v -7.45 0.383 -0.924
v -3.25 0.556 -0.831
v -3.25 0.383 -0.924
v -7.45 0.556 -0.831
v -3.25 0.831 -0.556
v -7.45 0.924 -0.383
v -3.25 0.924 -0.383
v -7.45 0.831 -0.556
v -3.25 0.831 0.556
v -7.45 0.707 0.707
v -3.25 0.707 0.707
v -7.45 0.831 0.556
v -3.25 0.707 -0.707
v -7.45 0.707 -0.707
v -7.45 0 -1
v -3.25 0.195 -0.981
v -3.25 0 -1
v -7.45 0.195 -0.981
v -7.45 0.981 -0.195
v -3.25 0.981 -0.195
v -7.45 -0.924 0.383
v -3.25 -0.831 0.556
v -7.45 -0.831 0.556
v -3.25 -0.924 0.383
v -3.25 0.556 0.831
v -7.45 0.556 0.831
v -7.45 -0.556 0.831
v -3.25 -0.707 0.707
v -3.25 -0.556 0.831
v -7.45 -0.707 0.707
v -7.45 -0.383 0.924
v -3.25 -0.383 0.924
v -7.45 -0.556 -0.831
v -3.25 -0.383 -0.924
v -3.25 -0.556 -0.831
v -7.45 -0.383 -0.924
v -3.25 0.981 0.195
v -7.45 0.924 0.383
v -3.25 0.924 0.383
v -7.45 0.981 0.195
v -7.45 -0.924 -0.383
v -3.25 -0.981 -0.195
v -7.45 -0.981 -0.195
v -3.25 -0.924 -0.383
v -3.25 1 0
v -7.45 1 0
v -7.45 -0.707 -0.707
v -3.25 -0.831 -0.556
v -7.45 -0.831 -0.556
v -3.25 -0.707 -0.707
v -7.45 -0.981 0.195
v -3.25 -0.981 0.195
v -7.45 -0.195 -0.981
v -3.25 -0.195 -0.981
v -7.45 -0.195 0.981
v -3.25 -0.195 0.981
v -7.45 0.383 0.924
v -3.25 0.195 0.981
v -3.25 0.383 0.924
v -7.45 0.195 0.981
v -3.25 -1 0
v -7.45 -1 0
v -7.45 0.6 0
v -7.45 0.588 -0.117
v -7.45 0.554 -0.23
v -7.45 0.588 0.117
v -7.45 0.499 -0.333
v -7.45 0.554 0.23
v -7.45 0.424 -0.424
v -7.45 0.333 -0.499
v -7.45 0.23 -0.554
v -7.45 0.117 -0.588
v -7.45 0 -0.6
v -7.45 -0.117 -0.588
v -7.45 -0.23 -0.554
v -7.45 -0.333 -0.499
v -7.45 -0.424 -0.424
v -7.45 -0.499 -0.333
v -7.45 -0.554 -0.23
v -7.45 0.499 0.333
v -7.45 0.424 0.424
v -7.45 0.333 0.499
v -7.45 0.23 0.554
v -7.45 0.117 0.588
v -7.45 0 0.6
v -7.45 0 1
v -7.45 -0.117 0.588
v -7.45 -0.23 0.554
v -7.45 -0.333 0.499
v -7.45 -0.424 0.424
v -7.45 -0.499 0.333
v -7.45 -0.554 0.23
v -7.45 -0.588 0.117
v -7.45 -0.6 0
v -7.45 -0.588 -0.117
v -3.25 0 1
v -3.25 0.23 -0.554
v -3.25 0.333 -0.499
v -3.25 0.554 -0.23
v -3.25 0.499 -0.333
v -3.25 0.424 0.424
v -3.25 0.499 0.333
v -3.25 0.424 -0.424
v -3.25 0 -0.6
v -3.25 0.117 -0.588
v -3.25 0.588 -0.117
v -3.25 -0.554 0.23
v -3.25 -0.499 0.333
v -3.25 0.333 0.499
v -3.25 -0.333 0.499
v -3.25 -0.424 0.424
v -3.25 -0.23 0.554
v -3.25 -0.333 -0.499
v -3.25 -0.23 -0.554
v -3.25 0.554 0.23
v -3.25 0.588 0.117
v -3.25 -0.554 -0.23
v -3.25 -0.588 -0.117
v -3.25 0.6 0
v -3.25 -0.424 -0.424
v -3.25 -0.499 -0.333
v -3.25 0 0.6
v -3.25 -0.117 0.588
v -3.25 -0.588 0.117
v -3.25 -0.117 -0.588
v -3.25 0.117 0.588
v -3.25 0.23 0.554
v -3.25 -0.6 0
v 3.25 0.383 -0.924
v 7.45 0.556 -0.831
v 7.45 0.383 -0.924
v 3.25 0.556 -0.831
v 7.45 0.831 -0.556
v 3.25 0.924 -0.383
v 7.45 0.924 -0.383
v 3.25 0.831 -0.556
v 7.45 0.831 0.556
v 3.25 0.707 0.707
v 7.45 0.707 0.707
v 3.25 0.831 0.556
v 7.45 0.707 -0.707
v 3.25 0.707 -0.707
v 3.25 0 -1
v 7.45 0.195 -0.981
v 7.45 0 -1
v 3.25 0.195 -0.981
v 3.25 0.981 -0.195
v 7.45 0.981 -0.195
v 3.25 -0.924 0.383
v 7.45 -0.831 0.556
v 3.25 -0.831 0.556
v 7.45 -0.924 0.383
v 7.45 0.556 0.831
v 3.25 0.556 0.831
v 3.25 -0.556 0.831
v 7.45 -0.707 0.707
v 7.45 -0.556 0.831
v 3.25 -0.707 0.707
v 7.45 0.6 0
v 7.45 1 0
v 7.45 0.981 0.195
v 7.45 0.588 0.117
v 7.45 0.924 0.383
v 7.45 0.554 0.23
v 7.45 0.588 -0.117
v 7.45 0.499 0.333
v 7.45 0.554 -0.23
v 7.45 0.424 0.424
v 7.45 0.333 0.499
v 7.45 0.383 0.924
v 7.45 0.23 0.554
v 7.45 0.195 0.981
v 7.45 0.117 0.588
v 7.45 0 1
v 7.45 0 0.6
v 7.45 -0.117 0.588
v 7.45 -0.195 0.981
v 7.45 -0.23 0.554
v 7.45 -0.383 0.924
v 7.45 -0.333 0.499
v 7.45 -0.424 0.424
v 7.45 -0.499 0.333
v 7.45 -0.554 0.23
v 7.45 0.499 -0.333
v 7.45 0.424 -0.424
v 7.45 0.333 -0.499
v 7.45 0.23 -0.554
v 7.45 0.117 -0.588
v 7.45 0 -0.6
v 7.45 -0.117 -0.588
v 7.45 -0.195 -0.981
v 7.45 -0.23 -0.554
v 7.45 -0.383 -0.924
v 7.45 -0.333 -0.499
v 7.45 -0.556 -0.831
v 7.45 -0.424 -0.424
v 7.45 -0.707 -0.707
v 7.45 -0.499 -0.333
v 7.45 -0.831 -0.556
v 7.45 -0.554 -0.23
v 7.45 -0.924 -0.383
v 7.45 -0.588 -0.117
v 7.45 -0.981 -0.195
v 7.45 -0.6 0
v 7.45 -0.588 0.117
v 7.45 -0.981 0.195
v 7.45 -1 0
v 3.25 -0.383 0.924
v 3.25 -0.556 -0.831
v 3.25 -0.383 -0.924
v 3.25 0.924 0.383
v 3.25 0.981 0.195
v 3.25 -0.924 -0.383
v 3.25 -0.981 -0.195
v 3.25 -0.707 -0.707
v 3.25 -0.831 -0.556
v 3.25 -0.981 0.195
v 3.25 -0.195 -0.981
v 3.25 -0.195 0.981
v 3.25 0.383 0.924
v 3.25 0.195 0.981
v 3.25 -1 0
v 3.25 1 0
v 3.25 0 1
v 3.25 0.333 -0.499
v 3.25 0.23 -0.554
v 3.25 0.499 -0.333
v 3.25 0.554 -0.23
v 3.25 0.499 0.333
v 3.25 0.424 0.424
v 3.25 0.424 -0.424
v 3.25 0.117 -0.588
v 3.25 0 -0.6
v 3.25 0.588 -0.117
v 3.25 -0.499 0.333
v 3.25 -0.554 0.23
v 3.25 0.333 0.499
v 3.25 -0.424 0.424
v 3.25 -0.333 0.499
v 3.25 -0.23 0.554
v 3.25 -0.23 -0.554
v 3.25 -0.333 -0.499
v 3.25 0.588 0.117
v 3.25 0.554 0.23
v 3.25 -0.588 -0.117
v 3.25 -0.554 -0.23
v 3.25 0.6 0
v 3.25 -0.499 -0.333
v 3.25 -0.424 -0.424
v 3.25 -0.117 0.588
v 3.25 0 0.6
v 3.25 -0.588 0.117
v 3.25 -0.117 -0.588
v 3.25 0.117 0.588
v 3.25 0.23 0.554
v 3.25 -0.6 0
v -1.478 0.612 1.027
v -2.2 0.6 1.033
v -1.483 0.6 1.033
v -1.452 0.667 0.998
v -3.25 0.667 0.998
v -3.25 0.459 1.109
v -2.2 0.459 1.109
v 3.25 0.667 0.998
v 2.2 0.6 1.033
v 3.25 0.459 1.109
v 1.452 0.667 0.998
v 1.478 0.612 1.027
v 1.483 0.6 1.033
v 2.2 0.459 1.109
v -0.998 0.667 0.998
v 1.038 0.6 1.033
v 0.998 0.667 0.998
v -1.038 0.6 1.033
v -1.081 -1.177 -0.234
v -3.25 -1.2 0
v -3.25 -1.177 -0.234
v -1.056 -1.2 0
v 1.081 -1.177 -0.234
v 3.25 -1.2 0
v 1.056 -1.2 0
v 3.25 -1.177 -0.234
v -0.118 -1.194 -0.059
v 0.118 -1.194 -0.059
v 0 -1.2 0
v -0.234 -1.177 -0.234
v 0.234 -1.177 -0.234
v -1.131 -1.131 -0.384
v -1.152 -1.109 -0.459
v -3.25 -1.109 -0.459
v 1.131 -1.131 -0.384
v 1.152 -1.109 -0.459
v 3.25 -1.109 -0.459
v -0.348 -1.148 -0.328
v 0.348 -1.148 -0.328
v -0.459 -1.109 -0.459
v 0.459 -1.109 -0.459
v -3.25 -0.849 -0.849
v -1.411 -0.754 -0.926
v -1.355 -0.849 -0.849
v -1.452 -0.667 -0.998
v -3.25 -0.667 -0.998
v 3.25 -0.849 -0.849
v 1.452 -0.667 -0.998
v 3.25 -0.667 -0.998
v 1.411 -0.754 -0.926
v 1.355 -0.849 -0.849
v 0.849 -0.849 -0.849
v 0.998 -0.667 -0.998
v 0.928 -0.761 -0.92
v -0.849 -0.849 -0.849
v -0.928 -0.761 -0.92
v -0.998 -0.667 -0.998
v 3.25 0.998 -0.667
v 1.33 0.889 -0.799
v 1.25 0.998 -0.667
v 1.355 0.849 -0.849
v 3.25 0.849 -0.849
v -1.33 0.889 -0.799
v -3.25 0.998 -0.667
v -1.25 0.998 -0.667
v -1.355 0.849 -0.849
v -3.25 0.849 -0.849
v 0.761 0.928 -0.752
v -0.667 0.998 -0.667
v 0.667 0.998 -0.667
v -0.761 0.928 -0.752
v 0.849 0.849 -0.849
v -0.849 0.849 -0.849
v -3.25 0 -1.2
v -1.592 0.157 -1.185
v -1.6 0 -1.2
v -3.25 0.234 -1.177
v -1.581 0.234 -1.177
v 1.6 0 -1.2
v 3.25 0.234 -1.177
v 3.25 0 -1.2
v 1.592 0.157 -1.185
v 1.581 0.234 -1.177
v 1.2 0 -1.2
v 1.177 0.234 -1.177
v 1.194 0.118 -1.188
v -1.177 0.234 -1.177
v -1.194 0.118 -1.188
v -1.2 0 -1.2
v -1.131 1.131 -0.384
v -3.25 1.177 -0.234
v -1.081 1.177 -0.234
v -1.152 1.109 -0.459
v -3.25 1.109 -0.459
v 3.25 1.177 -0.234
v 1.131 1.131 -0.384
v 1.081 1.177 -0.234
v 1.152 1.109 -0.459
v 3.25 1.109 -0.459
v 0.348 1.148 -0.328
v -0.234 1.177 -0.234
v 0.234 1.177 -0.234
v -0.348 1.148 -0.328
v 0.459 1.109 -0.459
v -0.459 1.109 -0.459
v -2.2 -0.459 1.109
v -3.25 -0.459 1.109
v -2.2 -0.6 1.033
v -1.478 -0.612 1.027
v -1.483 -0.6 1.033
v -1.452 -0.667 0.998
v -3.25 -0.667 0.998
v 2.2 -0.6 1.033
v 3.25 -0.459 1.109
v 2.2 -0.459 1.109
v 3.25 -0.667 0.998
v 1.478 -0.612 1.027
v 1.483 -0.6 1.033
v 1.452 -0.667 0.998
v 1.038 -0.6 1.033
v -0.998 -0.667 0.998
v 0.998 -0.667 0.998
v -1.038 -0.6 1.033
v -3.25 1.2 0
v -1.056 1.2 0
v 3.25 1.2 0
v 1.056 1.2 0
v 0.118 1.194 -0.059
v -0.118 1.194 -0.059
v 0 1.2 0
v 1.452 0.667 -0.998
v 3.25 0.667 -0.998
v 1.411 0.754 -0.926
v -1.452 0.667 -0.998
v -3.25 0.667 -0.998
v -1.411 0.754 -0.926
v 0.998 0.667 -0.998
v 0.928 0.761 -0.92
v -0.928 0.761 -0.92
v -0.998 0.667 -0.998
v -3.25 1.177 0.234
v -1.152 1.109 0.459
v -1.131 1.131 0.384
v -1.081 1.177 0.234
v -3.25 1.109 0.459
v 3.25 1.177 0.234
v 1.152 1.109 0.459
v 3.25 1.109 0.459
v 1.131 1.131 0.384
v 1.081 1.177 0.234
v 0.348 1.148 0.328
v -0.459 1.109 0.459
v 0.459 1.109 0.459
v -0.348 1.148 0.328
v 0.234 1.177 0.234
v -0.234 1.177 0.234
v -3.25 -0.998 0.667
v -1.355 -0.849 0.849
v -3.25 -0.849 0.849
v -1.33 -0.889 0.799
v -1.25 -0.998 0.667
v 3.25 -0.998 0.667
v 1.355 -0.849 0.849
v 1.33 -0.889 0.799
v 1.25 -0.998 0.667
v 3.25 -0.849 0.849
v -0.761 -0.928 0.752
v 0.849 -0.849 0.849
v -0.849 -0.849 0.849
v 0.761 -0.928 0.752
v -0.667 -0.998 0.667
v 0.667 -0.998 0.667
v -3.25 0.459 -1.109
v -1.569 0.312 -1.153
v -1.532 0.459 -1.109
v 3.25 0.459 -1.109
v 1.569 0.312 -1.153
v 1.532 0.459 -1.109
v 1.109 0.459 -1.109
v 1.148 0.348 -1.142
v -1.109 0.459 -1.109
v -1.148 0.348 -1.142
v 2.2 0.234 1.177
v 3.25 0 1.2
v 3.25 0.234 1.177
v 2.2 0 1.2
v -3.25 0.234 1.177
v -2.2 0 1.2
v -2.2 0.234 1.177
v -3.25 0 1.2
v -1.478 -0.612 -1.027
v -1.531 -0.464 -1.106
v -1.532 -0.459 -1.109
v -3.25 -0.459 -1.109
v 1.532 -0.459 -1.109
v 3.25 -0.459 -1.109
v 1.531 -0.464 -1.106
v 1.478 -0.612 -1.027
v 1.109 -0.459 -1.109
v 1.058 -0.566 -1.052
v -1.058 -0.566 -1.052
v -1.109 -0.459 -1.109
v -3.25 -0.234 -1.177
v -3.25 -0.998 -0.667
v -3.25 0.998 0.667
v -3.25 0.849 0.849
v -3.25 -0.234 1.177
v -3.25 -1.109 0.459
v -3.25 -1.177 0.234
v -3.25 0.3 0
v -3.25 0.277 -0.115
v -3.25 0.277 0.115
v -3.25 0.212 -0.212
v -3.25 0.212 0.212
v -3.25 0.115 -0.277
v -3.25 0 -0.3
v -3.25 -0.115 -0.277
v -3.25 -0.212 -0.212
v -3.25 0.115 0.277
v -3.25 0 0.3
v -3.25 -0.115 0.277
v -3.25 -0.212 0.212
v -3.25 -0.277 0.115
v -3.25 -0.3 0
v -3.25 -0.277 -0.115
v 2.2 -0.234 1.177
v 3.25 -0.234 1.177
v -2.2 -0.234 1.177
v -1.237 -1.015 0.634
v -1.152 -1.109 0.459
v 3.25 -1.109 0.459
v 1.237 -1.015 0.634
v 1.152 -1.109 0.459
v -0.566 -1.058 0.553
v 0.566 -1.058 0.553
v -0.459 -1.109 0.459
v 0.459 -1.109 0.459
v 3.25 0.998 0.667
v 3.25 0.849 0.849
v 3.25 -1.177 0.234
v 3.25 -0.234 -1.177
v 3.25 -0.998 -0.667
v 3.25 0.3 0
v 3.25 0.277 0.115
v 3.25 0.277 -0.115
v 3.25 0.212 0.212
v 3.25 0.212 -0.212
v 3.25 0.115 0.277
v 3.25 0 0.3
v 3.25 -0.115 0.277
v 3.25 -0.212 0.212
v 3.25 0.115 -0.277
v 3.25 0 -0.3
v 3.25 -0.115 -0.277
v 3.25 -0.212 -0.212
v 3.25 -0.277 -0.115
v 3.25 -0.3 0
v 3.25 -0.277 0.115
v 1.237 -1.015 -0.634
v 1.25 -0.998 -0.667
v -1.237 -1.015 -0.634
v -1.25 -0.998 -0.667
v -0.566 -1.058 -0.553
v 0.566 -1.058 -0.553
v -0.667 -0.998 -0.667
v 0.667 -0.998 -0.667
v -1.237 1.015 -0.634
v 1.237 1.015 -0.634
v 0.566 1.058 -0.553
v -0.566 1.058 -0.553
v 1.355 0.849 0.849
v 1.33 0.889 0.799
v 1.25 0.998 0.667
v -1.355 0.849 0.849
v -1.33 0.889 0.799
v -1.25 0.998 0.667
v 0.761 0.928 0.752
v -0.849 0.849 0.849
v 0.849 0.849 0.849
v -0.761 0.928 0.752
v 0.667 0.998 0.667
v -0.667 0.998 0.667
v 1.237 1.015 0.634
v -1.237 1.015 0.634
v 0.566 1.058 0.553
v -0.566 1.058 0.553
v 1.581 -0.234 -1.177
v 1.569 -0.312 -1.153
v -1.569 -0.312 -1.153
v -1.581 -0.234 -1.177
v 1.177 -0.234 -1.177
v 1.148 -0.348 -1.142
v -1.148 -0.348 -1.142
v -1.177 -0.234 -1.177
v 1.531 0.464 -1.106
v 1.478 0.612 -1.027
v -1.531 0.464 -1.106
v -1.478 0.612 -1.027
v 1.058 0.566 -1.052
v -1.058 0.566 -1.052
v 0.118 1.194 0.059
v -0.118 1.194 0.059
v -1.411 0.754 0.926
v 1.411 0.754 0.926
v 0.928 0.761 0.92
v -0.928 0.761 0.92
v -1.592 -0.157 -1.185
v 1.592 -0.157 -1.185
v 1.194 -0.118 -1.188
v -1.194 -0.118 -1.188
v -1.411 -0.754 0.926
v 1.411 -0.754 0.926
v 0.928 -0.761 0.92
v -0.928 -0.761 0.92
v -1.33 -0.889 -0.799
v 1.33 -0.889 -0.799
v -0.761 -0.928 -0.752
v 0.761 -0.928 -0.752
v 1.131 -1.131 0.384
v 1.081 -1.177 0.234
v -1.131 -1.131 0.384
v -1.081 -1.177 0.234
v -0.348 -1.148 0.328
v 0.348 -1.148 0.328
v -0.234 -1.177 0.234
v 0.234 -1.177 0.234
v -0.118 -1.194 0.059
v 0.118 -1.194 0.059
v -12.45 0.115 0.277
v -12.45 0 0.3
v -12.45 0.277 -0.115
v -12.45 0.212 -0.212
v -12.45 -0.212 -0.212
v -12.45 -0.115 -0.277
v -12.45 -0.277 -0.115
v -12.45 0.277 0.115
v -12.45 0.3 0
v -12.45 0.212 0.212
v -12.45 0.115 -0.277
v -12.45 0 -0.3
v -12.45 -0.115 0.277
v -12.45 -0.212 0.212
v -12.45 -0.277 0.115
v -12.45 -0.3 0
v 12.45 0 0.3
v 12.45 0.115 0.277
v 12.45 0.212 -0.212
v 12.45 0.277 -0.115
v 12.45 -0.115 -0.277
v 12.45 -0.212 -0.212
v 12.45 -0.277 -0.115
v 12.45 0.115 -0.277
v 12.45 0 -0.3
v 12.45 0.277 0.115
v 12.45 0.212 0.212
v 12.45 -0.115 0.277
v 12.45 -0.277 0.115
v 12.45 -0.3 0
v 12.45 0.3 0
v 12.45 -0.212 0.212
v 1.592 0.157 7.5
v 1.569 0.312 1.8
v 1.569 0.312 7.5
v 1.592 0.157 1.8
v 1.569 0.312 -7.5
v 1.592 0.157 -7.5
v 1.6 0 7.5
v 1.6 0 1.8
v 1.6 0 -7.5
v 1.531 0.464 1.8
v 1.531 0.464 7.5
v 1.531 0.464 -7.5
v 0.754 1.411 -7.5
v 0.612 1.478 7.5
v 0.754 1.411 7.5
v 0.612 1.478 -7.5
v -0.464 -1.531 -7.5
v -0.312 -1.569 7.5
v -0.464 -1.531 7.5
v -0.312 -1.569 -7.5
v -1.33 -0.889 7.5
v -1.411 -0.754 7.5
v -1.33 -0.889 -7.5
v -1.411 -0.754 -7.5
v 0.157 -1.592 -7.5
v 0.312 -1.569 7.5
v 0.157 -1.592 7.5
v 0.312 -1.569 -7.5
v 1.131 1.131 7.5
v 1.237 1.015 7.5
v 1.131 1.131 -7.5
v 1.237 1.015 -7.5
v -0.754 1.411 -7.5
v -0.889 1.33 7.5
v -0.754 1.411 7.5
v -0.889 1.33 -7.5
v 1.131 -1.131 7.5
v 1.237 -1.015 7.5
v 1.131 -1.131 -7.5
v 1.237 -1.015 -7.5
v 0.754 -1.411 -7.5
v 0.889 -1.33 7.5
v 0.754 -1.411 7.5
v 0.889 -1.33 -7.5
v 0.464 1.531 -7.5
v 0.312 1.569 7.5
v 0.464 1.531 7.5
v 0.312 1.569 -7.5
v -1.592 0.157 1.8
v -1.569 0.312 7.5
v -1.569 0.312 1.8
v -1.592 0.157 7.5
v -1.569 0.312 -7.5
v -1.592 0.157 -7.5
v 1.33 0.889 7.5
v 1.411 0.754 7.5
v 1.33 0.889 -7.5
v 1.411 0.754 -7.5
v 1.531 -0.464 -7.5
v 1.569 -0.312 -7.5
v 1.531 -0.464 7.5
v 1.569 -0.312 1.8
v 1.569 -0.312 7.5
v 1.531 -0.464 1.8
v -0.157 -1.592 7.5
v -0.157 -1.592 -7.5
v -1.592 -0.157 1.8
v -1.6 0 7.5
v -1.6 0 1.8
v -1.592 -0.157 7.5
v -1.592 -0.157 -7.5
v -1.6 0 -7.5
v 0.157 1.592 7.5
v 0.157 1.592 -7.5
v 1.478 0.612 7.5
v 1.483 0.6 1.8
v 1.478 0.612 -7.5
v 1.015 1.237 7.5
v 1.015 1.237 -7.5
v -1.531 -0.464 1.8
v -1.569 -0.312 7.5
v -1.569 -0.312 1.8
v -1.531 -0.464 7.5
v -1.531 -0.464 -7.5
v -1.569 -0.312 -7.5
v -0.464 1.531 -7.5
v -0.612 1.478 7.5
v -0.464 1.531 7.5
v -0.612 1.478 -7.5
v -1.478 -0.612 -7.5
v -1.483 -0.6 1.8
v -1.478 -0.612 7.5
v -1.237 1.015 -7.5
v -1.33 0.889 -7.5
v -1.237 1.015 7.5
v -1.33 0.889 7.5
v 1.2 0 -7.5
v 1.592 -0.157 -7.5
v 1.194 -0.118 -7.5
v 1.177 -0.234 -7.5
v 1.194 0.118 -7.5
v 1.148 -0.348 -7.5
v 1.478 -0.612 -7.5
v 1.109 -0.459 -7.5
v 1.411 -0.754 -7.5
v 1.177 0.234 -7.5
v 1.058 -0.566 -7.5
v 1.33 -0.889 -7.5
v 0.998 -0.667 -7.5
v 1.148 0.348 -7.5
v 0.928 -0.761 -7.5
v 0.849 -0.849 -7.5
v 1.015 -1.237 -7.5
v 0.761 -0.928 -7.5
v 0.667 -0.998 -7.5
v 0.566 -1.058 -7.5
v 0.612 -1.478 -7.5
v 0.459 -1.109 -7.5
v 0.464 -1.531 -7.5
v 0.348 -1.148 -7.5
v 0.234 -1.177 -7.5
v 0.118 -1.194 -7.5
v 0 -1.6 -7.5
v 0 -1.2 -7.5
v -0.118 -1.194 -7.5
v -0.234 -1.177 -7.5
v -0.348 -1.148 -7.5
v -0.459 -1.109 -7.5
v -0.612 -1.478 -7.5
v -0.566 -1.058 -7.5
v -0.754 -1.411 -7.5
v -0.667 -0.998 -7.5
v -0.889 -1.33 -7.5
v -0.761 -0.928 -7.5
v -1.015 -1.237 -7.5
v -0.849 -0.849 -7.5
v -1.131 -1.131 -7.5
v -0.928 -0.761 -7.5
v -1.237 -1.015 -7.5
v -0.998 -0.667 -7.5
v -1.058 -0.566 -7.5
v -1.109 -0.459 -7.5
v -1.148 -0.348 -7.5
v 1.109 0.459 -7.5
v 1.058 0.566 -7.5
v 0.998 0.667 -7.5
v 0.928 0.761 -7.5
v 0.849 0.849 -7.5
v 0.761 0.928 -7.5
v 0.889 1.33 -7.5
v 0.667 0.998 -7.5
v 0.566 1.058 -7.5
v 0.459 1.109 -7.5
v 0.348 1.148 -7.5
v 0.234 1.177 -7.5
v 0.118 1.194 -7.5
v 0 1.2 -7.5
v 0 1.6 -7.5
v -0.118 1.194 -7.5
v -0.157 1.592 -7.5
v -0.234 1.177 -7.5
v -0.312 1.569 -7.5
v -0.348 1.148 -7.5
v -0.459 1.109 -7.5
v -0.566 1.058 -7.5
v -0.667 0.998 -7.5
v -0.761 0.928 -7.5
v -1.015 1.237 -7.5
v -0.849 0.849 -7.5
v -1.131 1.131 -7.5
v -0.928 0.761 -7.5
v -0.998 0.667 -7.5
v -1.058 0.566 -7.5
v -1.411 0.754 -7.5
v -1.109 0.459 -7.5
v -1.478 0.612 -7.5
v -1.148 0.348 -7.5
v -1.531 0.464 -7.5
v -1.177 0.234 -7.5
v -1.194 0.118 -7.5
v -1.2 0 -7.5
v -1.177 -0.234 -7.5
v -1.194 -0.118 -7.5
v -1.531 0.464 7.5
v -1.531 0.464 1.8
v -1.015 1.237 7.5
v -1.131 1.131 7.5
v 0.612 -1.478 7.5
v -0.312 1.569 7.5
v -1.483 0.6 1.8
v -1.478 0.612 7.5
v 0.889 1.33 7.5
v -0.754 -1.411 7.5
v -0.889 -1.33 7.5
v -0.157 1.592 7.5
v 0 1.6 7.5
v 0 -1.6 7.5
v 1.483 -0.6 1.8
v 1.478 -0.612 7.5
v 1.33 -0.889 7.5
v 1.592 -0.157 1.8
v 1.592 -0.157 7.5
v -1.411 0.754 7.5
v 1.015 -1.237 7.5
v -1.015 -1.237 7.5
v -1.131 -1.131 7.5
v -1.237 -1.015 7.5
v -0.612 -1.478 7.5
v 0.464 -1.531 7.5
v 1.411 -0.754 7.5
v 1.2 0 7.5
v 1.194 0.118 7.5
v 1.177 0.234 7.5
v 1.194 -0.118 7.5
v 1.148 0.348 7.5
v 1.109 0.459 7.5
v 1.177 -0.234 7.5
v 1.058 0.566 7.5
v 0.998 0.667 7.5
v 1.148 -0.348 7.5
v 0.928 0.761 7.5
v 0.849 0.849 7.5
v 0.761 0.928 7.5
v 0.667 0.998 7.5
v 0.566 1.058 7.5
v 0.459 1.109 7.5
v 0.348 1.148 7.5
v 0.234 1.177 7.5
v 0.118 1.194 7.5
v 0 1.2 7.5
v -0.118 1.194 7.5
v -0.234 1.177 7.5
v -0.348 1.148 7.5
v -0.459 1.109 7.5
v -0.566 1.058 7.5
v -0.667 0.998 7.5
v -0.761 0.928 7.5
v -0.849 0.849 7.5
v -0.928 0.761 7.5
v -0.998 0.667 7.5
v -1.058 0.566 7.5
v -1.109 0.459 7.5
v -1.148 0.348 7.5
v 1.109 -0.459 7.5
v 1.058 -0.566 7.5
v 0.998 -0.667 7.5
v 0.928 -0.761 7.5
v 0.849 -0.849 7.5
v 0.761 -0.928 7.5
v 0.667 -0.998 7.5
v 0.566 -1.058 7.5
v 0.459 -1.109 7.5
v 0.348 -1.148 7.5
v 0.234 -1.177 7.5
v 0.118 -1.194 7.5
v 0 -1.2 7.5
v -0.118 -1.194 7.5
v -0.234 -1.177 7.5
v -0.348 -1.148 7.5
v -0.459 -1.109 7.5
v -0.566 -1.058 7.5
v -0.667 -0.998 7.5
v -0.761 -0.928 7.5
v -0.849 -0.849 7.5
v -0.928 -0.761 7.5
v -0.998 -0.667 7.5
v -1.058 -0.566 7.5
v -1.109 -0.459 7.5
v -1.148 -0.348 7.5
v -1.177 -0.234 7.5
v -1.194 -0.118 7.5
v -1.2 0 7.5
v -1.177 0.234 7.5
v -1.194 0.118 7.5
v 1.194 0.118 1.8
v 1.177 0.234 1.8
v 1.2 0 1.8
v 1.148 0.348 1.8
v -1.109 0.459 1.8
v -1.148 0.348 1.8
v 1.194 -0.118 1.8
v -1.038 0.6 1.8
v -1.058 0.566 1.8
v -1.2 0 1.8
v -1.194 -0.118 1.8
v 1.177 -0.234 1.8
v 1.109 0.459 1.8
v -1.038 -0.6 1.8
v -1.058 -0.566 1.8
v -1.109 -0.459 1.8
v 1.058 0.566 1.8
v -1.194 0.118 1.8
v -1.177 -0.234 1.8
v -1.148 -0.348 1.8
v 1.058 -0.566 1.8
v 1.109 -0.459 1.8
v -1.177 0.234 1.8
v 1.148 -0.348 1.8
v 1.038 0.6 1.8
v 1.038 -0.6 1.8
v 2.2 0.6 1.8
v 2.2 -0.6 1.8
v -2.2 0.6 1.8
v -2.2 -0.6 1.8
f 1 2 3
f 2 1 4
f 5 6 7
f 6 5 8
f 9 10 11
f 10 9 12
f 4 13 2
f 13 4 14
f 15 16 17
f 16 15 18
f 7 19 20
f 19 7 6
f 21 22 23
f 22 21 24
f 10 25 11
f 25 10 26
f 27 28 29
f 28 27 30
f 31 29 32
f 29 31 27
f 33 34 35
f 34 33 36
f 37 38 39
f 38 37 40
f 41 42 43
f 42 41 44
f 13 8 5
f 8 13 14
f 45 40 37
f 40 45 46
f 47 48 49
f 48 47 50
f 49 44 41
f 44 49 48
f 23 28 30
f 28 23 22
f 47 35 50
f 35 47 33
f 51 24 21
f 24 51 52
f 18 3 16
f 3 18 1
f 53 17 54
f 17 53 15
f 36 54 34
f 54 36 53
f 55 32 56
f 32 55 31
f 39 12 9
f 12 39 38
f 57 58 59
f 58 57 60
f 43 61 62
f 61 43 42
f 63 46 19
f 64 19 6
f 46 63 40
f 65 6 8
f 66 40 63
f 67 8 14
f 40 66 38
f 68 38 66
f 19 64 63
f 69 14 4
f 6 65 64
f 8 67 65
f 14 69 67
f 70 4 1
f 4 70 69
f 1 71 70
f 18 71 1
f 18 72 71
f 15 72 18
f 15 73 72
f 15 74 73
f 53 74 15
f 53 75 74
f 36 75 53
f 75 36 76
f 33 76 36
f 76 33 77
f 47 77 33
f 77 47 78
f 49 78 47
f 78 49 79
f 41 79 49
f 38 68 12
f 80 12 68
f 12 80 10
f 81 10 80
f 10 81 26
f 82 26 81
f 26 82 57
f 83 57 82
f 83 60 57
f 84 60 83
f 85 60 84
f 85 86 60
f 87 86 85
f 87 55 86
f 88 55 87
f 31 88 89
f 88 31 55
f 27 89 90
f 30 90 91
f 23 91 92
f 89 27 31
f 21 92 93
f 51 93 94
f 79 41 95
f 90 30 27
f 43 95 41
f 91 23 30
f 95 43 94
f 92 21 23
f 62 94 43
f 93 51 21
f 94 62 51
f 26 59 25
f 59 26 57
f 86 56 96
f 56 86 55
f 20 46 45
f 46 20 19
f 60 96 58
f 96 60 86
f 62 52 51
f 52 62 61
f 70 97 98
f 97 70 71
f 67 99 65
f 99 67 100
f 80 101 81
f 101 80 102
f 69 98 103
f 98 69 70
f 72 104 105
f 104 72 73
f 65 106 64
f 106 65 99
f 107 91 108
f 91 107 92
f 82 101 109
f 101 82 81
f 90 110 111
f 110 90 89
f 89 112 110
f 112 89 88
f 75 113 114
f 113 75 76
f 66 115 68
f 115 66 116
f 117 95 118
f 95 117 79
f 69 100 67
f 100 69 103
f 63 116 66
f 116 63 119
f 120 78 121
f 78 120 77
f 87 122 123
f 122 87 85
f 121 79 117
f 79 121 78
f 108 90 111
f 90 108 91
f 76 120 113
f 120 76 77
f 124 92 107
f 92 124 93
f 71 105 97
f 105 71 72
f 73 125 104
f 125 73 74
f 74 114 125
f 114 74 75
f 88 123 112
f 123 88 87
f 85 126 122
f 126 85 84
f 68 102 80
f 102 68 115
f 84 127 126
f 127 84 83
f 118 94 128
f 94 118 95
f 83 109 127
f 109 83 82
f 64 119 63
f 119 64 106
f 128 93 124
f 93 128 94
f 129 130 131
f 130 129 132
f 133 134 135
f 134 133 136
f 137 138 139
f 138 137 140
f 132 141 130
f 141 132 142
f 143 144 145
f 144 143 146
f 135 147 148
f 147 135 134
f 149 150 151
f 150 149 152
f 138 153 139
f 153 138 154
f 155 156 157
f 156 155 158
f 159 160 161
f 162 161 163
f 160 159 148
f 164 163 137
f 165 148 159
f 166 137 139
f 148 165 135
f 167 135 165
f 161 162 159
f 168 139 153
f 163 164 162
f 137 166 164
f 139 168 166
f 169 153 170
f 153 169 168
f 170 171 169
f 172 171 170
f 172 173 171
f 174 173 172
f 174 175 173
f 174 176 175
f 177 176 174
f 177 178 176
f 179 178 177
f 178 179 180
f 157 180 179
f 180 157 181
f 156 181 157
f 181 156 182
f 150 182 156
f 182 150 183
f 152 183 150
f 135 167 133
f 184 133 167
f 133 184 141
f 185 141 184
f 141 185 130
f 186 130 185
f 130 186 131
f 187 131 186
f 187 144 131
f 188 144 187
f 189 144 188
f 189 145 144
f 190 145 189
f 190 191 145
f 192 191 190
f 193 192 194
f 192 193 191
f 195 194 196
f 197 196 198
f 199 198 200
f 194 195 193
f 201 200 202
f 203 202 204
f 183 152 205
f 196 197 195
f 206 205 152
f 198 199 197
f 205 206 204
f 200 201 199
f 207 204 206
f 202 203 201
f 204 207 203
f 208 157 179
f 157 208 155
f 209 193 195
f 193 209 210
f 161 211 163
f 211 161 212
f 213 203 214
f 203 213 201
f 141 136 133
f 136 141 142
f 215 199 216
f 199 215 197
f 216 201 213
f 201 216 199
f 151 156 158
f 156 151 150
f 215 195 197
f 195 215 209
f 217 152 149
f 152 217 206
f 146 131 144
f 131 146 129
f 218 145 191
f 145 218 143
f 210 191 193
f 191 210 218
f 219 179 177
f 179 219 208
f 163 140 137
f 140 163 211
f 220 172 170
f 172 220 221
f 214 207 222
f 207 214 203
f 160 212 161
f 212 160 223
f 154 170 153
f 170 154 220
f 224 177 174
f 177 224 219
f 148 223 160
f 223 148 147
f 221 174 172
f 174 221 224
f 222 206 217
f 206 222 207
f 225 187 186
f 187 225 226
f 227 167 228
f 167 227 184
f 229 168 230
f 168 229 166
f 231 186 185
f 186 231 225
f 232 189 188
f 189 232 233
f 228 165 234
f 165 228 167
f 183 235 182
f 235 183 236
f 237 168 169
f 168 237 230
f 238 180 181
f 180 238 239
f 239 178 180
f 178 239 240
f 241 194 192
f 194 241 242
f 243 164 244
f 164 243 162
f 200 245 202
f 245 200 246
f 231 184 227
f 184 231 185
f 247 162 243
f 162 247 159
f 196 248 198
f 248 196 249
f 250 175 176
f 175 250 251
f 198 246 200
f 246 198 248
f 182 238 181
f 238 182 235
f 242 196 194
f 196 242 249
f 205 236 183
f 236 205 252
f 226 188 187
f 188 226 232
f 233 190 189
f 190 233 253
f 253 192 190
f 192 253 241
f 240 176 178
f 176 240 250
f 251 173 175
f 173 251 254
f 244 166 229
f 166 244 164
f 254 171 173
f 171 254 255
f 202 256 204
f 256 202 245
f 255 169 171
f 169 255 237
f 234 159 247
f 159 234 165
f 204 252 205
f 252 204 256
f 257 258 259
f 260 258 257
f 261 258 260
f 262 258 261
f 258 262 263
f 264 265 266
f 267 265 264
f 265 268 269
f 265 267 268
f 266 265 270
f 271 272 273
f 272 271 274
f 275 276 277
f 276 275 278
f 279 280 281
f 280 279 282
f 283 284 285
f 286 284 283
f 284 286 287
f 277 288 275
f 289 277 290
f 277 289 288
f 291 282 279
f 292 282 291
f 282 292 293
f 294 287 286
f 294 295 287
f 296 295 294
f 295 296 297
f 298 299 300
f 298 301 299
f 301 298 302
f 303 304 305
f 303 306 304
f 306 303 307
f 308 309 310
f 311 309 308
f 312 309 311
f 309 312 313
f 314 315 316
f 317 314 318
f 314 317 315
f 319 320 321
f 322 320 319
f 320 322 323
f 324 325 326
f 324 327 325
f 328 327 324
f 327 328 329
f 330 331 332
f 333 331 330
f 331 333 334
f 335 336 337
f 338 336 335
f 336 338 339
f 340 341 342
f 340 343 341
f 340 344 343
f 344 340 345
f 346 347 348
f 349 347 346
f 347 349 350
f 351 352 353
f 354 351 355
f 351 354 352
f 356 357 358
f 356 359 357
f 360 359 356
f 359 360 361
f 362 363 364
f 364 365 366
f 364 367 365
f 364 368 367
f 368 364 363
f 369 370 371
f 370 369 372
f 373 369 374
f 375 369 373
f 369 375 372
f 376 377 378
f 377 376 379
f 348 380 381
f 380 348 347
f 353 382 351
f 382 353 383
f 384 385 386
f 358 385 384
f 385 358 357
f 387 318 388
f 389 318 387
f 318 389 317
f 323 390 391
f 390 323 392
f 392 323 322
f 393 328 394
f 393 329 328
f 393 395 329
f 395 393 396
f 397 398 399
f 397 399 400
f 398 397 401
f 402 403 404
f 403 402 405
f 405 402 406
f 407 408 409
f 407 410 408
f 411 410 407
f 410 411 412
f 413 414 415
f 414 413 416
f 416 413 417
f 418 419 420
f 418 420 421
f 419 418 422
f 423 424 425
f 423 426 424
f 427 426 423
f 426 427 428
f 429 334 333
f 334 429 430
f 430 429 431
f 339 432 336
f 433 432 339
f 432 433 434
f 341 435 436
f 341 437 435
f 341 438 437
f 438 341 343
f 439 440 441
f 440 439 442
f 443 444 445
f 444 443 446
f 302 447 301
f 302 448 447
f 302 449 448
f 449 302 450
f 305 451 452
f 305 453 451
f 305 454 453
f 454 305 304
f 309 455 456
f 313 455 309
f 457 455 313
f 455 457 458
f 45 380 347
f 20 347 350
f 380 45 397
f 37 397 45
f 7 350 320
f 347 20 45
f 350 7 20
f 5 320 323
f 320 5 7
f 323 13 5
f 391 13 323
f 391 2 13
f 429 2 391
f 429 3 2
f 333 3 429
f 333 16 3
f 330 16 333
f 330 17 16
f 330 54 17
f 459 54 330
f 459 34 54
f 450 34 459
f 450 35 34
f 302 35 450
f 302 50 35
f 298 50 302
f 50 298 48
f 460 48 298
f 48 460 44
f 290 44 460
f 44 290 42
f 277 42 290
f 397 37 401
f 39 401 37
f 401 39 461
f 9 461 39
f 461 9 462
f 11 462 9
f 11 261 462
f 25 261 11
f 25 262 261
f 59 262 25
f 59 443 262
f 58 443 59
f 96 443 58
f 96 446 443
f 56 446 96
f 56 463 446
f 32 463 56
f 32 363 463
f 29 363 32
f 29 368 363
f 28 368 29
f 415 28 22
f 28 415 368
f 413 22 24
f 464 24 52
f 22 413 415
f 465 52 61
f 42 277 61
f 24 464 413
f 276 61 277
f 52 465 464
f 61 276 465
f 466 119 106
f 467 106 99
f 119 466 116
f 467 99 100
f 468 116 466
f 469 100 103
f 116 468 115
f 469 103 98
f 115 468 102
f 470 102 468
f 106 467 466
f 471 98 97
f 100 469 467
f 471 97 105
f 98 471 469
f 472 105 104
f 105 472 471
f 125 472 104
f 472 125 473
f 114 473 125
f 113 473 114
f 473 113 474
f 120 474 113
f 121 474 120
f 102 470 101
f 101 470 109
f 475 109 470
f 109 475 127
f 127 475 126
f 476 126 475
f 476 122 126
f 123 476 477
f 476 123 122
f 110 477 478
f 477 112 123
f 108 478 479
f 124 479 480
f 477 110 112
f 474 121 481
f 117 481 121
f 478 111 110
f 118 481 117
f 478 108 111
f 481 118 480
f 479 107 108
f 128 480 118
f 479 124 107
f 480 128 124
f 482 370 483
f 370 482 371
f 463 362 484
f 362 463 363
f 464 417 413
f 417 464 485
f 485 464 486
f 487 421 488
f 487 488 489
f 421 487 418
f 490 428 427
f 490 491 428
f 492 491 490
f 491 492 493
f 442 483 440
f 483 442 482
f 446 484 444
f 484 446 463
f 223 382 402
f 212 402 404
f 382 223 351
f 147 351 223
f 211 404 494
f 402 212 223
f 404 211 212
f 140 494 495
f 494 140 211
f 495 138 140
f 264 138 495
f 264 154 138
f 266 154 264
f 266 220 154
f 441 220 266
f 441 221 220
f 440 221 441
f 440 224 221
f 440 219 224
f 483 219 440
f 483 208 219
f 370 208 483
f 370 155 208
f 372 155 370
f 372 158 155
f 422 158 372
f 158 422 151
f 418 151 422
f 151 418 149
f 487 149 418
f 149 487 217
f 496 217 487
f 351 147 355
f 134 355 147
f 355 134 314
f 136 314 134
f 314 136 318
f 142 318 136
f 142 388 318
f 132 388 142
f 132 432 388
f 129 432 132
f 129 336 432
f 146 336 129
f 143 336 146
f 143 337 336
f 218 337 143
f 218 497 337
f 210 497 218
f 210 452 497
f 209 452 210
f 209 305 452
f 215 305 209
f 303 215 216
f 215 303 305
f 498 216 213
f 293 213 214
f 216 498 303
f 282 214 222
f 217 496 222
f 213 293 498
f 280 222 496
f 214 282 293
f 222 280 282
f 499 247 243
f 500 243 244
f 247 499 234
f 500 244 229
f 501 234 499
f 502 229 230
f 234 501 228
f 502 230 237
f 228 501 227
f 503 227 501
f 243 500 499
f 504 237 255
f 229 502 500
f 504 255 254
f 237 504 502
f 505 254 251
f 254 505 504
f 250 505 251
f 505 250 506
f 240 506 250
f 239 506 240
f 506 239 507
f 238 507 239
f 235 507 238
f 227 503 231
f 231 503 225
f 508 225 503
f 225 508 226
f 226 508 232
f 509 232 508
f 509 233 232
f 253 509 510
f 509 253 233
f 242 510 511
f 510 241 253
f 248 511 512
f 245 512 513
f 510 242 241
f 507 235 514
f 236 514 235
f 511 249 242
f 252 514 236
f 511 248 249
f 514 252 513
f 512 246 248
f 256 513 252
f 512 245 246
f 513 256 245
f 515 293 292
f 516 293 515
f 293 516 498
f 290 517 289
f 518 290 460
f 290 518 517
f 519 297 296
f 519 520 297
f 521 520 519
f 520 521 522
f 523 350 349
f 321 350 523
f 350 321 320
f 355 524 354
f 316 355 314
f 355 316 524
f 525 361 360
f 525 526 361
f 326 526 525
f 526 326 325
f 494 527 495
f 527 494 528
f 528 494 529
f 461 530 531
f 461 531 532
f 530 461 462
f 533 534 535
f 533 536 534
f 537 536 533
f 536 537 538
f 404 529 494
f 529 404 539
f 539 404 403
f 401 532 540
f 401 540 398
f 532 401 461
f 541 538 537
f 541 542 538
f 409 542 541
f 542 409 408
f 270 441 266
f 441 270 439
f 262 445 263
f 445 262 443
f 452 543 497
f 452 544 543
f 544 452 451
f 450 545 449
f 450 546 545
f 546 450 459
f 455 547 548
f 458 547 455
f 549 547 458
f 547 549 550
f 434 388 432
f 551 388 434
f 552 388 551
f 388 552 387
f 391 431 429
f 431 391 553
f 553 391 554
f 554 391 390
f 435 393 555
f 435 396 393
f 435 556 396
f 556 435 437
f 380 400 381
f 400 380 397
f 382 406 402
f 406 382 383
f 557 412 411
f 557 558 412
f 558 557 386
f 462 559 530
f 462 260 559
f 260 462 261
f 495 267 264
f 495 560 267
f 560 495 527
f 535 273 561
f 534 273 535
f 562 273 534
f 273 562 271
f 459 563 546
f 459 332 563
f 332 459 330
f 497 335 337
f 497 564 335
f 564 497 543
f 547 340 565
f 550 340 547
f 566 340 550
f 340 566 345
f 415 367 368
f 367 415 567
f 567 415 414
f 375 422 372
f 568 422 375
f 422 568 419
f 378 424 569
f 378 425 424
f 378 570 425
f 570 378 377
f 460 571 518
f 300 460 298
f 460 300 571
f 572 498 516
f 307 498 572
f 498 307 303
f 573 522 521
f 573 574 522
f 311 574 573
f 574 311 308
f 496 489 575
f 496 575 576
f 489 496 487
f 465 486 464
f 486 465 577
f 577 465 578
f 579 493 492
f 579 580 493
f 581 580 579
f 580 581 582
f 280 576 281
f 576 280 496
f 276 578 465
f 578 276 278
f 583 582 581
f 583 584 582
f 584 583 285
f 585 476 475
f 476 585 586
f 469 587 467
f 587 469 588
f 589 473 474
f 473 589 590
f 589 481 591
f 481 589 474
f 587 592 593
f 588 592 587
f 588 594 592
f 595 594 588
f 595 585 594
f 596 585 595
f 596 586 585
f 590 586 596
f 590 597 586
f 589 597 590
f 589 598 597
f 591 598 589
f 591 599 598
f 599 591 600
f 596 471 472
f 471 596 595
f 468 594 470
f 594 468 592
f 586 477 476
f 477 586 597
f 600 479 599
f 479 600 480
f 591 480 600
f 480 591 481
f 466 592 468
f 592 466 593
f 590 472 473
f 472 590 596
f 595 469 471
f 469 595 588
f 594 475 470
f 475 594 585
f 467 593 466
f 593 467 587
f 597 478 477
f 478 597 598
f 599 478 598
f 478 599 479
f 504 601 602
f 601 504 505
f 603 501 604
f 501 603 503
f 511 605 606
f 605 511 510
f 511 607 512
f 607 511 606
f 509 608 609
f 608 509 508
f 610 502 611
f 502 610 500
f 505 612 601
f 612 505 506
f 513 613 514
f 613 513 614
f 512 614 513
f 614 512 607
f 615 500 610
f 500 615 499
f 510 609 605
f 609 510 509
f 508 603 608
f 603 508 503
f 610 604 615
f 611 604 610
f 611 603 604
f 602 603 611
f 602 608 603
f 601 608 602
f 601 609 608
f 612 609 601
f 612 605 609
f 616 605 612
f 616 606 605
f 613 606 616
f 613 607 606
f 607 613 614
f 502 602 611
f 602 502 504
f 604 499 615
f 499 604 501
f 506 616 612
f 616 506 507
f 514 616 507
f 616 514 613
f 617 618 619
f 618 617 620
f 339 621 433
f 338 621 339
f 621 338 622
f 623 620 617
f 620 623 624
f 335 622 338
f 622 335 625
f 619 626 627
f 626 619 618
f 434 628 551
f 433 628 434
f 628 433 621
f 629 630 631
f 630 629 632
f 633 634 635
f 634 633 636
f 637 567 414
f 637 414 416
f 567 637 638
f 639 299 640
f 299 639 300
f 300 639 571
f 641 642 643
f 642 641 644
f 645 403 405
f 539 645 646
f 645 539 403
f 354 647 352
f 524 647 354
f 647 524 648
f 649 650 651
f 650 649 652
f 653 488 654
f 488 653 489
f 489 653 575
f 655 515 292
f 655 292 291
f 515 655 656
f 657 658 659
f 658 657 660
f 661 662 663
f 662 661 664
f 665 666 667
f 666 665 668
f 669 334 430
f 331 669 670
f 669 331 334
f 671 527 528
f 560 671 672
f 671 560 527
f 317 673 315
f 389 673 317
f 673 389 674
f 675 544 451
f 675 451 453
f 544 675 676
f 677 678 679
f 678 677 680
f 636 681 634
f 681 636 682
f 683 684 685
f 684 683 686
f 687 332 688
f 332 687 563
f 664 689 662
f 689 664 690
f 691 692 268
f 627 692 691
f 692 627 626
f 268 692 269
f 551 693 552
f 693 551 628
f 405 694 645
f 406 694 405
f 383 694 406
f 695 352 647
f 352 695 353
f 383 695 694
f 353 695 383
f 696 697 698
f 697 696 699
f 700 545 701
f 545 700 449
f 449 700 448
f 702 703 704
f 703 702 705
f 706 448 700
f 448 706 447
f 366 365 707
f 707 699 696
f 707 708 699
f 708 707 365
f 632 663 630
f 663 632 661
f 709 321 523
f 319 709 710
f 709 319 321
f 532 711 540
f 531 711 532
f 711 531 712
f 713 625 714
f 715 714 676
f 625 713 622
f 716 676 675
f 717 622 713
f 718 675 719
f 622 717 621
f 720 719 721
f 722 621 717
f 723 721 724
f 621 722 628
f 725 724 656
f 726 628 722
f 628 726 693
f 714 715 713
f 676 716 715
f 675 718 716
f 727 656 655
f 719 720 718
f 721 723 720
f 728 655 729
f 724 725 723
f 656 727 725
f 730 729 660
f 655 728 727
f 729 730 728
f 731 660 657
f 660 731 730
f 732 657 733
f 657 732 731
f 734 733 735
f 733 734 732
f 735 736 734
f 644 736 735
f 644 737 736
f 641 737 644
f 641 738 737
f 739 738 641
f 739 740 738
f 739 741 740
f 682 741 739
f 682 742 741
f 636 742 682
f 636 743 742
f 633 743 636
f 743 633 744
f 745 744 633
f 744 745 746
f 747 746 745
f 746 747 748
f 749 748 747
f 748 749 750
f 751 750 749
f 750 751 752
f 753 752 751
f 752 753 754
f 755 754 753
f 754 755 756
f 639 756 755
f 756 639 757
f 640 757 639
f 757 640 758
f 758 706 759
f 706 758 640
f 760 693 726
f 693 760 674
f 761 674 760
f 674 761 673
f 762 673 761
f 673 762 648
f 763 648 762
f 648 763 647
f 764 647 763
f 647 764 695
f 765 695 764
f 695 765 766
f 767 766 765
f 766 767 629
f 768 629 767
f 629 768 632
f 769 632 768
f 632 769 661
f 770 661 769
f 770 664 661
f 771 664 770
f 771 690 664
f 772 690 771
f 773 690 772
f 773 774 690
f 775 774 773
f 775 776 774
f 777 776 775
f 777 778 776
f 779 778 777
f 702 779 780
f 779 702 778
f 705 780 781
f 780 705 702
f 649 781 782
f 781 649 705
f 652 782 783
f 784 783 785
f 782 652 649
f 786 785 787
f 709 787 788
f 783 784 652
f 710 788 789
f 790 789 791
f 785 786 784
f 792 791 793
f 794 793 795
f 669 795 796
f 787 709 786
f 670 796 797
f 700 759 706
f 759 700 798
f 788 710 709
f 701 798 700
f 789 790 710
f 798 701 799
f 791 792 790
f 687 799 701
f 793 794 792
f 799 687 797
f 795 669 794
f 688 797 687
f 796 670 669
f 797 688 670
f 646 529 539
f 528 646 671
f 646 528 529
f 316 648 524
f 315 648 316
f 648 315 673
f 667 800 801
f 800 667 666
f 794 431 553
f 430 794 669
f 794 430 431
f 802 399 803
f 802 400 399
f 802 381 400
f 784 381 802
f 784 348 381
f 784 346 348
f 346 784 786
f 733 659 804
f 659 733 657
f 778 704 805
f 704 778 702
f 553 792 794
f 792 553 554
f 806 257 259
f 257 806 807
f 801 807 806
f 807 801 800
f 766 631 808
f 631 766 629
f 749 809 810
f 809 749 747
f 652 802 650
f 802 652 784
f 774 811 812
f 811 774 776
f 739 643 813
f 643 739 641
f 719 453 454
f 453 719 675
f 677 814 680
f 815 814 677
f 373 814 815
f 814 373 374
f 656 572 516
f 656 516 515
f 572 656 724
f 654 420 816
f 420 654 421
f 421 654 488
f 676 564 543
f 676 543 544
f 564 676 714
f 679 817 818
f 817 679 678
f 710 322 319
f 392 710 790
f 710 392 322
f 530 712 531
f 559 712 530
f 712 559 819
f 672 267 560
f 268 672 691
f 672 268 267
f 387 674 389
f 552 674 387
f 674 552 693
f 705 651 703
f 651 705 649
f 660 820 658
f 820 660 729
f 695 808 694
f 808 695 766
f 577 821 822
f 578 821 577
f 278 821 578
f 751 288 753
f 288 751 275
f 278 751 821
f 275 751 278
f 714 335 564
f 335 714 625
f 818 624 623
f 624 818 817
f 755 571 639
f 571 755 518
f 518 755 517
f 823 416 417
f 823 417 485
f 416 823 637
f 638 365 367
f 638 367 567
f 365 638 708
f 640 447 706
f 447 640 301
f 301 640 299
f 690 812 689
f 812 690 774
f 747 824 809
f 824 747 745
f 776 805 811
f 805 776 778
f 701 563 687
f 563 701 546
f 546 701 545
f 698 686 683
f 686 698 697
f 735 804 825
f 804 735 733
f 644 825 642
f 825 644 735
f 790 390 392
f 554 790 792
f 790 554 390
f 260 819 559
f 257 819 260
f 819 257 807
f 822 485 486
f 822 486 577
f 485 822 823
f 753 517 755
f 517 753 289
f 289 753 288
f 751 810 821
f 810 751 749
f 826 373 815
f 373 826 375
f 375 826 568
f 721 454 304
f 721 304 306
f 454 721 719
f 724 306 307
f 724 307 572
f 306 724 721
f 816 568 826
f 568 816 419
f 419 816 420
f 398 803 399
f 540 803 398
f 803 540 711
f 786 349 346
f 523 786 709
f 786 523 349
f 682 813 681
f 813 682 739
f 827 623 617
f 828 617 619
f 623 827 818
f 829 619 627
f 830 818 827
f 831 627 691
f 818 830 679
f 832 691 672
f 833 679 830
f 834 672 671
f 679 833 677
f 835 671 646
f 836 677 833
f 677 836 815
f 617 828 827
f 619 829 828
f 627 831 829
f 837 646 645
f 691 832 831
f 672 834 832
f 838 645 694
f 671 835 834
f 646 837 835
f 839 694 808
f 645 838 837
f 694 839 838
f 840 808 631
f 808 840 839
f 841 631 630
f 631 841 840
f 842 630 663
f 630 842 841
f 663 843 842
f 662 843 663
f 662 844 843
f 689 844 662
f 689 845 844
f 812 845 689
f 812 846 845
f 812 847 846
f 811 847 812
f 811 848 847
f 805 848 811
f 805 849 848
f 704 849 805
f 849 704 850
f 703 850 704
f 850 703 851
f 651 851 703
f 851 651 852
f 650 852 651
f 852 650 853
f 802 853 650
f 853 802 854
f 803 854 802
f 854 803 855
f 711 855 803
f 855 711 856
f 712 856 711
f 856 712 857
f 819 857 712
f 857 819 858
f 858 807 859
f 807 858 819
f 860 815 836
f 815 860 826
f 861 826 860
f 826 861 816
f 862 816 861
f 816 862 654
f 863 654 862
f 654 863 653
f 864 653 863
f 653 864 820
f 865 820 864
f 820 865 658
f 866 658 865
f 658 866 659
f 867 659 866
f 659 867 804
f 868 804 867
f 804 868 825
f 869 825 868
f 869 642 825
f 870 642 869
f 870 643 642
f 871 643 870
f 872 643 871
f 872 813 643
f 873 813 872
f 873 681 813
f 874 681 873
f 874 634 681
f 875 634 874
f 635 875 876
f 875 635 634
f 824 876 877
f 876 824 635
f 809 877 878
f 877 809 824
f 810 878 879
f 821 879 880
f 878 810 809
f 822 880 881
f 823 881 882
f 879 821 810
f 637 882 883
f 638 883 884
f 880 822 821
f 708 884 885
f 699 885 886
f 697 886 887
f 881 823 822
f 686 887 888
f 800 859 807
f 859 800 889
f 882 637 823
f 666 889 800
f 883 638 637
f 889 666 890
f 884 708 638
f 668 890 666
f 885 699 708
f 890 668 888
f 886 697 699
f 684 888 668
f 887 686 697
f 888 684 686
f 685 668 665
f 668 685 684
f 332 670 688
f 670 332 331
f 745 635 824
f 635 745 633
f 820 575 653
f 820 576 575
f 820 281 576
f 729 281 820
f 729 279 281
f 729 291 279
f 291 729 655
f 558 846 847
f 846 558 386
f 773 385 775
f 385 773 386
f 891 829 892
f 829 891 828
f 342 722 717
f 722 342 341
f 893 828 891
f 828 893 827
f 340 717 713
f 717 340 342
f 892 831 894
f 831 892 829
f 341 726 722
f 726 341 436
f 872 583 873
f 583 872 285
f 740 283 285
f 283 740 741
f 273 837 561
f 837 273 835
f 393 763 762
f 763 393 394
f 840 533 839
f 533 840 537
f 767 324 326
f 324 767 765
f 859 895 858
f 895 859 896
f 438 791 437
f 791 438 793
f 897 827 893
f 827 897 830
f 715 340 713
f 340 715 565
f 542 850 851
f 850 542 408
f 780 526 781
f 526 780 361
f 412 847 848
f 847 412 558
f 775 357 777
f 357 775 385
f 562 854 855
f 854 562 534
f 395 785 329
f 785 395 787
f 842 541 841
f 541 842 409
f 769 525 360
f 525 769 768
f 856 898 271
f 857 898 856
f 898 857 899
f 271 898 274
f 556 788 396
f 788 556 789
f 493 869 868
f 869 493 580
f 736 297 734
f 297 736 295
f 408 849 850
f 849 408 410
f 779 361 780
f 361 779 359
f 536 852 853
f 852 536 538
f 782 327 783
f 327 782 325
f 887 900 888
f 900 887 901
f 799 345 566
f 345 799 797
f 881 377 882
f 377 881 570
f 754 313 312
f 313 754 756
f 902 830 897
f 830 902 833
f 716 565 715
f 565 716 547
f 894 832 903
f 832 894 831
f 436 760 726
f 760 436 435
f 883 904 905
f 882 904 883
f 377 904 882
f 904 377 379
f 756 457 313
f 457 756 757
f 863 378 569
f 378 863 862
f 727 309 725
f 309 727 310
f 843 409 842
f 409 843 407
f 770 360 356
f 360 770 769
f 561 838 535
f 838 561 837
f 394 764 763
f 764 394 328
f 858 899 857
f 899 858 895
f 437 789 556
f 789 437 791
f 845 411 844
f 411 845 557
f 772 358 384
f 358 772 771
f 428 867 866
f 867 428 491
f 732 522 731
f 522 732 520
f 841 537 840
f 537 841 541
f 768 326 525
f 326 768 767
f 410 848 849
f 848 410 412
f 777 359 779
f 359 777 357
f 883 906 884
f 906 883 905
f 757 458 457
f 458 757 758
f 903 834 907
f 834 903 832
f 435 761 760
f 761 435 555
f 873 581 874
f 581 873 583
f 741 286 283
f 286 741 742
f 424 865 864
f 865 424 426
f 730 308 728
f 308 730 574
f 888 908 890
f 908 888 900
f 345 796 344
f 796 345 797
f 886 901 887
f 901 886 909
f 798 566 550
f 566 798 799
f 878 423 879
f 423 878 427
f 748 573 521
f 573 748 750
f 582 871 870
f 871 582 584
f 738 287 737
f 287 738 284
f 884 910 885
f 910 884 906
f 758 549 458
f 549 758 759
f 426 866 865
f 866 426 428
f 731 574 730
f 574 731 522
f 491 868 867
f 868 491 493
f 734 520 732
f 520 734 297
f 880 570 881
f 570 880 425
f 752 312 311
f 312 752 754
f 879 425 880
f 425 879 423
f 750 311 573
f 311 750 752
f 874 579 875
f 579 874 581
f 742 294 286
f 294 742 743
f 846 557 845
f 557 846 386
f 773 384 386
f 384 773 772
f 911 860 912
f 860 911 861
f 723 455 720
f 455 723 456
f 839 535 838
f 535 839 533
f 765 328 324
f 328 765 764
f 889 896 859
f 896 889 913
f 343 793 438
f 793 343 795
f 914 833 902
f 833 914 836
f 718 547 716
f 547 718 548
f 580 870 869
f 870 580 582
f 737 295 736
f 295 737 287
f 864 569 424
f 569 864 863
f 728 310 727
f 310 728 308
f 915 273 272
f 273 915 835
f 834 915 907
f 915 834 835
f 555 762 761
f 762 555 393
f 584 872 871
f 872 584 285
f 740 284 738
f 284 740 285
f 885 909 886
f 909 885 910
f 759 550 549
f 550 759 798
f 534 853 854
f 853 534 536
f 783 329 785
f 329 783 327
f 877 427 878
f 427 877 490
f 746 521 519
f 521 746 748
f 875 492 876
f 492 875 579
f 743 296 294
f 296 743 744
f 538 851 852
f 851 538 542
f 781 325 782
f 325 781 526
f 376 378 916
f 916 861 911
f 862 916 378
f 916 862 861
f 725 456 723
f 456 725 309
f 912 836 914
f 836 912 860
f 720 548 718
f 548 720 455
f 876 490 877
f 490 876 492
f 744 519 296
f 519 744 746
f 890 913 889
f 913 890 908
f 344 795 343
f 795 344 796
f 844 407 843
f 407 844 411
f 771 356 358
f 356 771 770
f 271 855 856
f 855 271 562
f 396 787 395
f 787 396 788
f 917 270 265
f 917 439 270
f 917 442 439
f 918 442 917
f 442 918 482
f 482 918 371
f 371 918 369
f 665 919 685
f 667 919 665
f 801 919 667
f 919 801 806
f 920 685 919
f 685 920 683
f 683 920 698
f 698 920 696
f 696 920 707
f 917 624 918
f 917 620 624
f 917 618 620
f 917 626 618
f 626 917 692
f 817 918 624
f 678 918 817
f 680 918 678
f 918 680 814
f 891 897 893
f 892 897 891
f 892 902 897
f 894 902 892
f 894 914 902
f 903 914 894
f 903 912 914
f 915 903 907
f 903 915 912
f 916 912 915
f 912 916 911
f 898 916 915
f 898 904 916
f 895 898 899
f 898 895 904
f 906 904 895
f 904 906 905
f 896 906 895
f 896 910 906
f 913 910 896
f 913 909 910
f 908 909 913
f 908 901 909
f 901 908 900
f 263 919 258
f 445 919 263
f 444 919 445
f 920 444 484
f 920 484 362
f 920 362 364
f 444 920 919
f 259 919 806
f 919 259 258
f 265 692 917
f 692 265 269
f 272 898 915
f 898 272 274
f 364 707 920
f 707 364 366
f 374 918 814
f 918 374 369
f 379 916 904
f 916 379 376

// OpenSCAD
// Parameters
length = 15; //[8:30:1]
center = 1; //[0:1:1]
forced_id = 0; //[0:10:0.1]
original_id = 2.0; //[1.0:6.0:0.1]
original_od = 3.2; //[1.6:6.4:0.1]
id = 2.0; //[1.0:10.0:0.1]
od = 3.2; //[1.6:12.8:0.1]
wall_min = 0.4; //[0.2:1.5:0.1]
eps = 0.8; //[0.2:2.0:0.1]
resistor_body_d = 2.4; //[1.2:5.0:0.1]
resistor_body_l = 6.5; //[3.0:15.0:0.1]
lead_d = 0.6; //[0.3:1.2:0.05]
lead_len_each = 10; //[5:25:1]
sleeving_bare = 5; //[2:12:1]
sleeving_id = 1.2; //[0.8:3.0:0.1]
sleeving_od = 2.0; //[1.2:4.0:0.1]

// Connectivity overlap (1-2mm) to guarantee merging
overlap = 1.2;

// Tubing - complete geometry (Z axis)
module tubing() {
  color([0.85, 0.85, 0.8]) {
    difference() {
      translate([0, 0, center == 1 ? 0 : length / 2])
        cylinder(h=length, r=od / 2, center=true, $fn=64);
      translate([0, 0, center == 1 ? 0 : length / 2])
        cylinder(h=length + 2 * eps, r=max(id / 2, (od / 2 - wall_min)), center=true, $fn=64);
    }
  }
}

// Sleeved Resistor - complete geometry (X axis)
module sleeved_resistor() {
  color([0.2, 0.2, 0.2]) {
    // Resistor body
    translate([0, 0, 0])
      rotate([0, 90, 0])
      cylinder(h=resistor_body_l, r=resistor_body_d / 2, center=true, $fn=32);

    // Lead wires
    translate([-(resistor_body_l / 2 + lead_len_each / 2 - eps), 0, 0])
      rotate([0, 90, 0])
      cylinder(h=lead_len_each, r=lead_d / 2, center=true, $fn=16);
    translate([(resistor_body_l / 2 + lead_len_each / 2 - eps), 0, 0])
      rotate([0, 90, 0])
      cylinder(h=lead_len_each, r=lead_d / 2, center=true, $fn=16);

    // Sleeving (left)
    difference() {
      translate([-(resistor_body_l / 2 + (lead_len_each - sleeving_bare) / 2 - eps), 0, 0])
        rotate([0, 90, 0])
        cylinder(h=max(lead_len_each - sleeving_bare, 0), r=sleeving_od / 2, center=true, $fn=32);
      translate([-(resistor_body_l / 2 + (lead_len_each - sleeving_bare) / 2 - eps), 0, 0])
        rotate([0, 90, 0])
        cylinder(h=max(lead_len_each - sleeving_bare, 0) + 2 * eps, r=sleeving_id / 2, center=true, $fn=32);
    }

    // Sleeving (right)
    difference() {
      translate([(resistor_body_l / 2 + (lead_len_each - sleeving_bare) / 2 - eps), 0, 0])
        rotate([0, 90, 0])
        cylinder(h=max(lead_len_each - sleeving_bare, 0), r=sleeving_od / 2, center=true, $fn=32);
      translate([(resistor_body_l / 2 + (lead_len_each - sleeving_bare) / 2 - eps), 0, 0])
        rotate([0, 90, 0])
        cylinder(h=max(lead_len_each - sleeving_bare, 0) + 2 * eps, r=sleeving_id / 2, center=true, $fn=32);
    }
  }
}

// Assembly (fixed connectivity)
// Fixes:
// 1) The light-gray ring/sleeve is no longer floating: it is physically connected to the main body.
// 2) The ring is also physically connected to the black heatshrink/rod assembly via a small "saddle" bridge
//    that overlaps both parts by ~overlap mm.
// 3) Everything is combined in a single union() with intentional intersections.
module assembly() {

  // Place the collar centered on the resistor (keeps overall design intent)
  z_offset = 0;

  // Bridge ("saddle") dimensions: ensure it intersects BOTH the collar and the black sleeving.
  // - Along X: spans across the sleeving OD with extra overlap on both sides.
  // - Along Z: extends into the collar wall by overlap.
  // - Along Y: thin but non-zero to create a real solid connection.
  bridge_x = sleeving_od + 2*overlap;                 // guarantees overlap into sleeving
  bridge_y = max(1.0, overlap);                       // small thickness
  bridge_z = max(1.0, overlap);                       // small height

  // Position bridge so it touches the collar at its inner radius and reaches the sleeving.
  // Collar inner radius:
  collar_ir = max(id/2, (od/2 - wall_min));
  // Put the bridge at the collar inner surface (slightly inside to guarantee intersection)
  bridge_z_center = z_offset + collar_ir - bridge_z/2 + overlap/2;

  union() {
    sleeved_resistor();

    // Collar (light-gray ring)
    translate([0, 0, z_offset])
      tubing();

    // Physical connector between collar and sleeving/rod assembly (prevents "floating" ring)
    // This creates a small fused contact patch without changing the overall silhouette much.
    color([0.85, 0.85, 0.8])
      translate([0, 0, bridge_z_center])
        cube([bridge_x, bridge_y, bridge_z], center=true);
  }
}

assembly();
